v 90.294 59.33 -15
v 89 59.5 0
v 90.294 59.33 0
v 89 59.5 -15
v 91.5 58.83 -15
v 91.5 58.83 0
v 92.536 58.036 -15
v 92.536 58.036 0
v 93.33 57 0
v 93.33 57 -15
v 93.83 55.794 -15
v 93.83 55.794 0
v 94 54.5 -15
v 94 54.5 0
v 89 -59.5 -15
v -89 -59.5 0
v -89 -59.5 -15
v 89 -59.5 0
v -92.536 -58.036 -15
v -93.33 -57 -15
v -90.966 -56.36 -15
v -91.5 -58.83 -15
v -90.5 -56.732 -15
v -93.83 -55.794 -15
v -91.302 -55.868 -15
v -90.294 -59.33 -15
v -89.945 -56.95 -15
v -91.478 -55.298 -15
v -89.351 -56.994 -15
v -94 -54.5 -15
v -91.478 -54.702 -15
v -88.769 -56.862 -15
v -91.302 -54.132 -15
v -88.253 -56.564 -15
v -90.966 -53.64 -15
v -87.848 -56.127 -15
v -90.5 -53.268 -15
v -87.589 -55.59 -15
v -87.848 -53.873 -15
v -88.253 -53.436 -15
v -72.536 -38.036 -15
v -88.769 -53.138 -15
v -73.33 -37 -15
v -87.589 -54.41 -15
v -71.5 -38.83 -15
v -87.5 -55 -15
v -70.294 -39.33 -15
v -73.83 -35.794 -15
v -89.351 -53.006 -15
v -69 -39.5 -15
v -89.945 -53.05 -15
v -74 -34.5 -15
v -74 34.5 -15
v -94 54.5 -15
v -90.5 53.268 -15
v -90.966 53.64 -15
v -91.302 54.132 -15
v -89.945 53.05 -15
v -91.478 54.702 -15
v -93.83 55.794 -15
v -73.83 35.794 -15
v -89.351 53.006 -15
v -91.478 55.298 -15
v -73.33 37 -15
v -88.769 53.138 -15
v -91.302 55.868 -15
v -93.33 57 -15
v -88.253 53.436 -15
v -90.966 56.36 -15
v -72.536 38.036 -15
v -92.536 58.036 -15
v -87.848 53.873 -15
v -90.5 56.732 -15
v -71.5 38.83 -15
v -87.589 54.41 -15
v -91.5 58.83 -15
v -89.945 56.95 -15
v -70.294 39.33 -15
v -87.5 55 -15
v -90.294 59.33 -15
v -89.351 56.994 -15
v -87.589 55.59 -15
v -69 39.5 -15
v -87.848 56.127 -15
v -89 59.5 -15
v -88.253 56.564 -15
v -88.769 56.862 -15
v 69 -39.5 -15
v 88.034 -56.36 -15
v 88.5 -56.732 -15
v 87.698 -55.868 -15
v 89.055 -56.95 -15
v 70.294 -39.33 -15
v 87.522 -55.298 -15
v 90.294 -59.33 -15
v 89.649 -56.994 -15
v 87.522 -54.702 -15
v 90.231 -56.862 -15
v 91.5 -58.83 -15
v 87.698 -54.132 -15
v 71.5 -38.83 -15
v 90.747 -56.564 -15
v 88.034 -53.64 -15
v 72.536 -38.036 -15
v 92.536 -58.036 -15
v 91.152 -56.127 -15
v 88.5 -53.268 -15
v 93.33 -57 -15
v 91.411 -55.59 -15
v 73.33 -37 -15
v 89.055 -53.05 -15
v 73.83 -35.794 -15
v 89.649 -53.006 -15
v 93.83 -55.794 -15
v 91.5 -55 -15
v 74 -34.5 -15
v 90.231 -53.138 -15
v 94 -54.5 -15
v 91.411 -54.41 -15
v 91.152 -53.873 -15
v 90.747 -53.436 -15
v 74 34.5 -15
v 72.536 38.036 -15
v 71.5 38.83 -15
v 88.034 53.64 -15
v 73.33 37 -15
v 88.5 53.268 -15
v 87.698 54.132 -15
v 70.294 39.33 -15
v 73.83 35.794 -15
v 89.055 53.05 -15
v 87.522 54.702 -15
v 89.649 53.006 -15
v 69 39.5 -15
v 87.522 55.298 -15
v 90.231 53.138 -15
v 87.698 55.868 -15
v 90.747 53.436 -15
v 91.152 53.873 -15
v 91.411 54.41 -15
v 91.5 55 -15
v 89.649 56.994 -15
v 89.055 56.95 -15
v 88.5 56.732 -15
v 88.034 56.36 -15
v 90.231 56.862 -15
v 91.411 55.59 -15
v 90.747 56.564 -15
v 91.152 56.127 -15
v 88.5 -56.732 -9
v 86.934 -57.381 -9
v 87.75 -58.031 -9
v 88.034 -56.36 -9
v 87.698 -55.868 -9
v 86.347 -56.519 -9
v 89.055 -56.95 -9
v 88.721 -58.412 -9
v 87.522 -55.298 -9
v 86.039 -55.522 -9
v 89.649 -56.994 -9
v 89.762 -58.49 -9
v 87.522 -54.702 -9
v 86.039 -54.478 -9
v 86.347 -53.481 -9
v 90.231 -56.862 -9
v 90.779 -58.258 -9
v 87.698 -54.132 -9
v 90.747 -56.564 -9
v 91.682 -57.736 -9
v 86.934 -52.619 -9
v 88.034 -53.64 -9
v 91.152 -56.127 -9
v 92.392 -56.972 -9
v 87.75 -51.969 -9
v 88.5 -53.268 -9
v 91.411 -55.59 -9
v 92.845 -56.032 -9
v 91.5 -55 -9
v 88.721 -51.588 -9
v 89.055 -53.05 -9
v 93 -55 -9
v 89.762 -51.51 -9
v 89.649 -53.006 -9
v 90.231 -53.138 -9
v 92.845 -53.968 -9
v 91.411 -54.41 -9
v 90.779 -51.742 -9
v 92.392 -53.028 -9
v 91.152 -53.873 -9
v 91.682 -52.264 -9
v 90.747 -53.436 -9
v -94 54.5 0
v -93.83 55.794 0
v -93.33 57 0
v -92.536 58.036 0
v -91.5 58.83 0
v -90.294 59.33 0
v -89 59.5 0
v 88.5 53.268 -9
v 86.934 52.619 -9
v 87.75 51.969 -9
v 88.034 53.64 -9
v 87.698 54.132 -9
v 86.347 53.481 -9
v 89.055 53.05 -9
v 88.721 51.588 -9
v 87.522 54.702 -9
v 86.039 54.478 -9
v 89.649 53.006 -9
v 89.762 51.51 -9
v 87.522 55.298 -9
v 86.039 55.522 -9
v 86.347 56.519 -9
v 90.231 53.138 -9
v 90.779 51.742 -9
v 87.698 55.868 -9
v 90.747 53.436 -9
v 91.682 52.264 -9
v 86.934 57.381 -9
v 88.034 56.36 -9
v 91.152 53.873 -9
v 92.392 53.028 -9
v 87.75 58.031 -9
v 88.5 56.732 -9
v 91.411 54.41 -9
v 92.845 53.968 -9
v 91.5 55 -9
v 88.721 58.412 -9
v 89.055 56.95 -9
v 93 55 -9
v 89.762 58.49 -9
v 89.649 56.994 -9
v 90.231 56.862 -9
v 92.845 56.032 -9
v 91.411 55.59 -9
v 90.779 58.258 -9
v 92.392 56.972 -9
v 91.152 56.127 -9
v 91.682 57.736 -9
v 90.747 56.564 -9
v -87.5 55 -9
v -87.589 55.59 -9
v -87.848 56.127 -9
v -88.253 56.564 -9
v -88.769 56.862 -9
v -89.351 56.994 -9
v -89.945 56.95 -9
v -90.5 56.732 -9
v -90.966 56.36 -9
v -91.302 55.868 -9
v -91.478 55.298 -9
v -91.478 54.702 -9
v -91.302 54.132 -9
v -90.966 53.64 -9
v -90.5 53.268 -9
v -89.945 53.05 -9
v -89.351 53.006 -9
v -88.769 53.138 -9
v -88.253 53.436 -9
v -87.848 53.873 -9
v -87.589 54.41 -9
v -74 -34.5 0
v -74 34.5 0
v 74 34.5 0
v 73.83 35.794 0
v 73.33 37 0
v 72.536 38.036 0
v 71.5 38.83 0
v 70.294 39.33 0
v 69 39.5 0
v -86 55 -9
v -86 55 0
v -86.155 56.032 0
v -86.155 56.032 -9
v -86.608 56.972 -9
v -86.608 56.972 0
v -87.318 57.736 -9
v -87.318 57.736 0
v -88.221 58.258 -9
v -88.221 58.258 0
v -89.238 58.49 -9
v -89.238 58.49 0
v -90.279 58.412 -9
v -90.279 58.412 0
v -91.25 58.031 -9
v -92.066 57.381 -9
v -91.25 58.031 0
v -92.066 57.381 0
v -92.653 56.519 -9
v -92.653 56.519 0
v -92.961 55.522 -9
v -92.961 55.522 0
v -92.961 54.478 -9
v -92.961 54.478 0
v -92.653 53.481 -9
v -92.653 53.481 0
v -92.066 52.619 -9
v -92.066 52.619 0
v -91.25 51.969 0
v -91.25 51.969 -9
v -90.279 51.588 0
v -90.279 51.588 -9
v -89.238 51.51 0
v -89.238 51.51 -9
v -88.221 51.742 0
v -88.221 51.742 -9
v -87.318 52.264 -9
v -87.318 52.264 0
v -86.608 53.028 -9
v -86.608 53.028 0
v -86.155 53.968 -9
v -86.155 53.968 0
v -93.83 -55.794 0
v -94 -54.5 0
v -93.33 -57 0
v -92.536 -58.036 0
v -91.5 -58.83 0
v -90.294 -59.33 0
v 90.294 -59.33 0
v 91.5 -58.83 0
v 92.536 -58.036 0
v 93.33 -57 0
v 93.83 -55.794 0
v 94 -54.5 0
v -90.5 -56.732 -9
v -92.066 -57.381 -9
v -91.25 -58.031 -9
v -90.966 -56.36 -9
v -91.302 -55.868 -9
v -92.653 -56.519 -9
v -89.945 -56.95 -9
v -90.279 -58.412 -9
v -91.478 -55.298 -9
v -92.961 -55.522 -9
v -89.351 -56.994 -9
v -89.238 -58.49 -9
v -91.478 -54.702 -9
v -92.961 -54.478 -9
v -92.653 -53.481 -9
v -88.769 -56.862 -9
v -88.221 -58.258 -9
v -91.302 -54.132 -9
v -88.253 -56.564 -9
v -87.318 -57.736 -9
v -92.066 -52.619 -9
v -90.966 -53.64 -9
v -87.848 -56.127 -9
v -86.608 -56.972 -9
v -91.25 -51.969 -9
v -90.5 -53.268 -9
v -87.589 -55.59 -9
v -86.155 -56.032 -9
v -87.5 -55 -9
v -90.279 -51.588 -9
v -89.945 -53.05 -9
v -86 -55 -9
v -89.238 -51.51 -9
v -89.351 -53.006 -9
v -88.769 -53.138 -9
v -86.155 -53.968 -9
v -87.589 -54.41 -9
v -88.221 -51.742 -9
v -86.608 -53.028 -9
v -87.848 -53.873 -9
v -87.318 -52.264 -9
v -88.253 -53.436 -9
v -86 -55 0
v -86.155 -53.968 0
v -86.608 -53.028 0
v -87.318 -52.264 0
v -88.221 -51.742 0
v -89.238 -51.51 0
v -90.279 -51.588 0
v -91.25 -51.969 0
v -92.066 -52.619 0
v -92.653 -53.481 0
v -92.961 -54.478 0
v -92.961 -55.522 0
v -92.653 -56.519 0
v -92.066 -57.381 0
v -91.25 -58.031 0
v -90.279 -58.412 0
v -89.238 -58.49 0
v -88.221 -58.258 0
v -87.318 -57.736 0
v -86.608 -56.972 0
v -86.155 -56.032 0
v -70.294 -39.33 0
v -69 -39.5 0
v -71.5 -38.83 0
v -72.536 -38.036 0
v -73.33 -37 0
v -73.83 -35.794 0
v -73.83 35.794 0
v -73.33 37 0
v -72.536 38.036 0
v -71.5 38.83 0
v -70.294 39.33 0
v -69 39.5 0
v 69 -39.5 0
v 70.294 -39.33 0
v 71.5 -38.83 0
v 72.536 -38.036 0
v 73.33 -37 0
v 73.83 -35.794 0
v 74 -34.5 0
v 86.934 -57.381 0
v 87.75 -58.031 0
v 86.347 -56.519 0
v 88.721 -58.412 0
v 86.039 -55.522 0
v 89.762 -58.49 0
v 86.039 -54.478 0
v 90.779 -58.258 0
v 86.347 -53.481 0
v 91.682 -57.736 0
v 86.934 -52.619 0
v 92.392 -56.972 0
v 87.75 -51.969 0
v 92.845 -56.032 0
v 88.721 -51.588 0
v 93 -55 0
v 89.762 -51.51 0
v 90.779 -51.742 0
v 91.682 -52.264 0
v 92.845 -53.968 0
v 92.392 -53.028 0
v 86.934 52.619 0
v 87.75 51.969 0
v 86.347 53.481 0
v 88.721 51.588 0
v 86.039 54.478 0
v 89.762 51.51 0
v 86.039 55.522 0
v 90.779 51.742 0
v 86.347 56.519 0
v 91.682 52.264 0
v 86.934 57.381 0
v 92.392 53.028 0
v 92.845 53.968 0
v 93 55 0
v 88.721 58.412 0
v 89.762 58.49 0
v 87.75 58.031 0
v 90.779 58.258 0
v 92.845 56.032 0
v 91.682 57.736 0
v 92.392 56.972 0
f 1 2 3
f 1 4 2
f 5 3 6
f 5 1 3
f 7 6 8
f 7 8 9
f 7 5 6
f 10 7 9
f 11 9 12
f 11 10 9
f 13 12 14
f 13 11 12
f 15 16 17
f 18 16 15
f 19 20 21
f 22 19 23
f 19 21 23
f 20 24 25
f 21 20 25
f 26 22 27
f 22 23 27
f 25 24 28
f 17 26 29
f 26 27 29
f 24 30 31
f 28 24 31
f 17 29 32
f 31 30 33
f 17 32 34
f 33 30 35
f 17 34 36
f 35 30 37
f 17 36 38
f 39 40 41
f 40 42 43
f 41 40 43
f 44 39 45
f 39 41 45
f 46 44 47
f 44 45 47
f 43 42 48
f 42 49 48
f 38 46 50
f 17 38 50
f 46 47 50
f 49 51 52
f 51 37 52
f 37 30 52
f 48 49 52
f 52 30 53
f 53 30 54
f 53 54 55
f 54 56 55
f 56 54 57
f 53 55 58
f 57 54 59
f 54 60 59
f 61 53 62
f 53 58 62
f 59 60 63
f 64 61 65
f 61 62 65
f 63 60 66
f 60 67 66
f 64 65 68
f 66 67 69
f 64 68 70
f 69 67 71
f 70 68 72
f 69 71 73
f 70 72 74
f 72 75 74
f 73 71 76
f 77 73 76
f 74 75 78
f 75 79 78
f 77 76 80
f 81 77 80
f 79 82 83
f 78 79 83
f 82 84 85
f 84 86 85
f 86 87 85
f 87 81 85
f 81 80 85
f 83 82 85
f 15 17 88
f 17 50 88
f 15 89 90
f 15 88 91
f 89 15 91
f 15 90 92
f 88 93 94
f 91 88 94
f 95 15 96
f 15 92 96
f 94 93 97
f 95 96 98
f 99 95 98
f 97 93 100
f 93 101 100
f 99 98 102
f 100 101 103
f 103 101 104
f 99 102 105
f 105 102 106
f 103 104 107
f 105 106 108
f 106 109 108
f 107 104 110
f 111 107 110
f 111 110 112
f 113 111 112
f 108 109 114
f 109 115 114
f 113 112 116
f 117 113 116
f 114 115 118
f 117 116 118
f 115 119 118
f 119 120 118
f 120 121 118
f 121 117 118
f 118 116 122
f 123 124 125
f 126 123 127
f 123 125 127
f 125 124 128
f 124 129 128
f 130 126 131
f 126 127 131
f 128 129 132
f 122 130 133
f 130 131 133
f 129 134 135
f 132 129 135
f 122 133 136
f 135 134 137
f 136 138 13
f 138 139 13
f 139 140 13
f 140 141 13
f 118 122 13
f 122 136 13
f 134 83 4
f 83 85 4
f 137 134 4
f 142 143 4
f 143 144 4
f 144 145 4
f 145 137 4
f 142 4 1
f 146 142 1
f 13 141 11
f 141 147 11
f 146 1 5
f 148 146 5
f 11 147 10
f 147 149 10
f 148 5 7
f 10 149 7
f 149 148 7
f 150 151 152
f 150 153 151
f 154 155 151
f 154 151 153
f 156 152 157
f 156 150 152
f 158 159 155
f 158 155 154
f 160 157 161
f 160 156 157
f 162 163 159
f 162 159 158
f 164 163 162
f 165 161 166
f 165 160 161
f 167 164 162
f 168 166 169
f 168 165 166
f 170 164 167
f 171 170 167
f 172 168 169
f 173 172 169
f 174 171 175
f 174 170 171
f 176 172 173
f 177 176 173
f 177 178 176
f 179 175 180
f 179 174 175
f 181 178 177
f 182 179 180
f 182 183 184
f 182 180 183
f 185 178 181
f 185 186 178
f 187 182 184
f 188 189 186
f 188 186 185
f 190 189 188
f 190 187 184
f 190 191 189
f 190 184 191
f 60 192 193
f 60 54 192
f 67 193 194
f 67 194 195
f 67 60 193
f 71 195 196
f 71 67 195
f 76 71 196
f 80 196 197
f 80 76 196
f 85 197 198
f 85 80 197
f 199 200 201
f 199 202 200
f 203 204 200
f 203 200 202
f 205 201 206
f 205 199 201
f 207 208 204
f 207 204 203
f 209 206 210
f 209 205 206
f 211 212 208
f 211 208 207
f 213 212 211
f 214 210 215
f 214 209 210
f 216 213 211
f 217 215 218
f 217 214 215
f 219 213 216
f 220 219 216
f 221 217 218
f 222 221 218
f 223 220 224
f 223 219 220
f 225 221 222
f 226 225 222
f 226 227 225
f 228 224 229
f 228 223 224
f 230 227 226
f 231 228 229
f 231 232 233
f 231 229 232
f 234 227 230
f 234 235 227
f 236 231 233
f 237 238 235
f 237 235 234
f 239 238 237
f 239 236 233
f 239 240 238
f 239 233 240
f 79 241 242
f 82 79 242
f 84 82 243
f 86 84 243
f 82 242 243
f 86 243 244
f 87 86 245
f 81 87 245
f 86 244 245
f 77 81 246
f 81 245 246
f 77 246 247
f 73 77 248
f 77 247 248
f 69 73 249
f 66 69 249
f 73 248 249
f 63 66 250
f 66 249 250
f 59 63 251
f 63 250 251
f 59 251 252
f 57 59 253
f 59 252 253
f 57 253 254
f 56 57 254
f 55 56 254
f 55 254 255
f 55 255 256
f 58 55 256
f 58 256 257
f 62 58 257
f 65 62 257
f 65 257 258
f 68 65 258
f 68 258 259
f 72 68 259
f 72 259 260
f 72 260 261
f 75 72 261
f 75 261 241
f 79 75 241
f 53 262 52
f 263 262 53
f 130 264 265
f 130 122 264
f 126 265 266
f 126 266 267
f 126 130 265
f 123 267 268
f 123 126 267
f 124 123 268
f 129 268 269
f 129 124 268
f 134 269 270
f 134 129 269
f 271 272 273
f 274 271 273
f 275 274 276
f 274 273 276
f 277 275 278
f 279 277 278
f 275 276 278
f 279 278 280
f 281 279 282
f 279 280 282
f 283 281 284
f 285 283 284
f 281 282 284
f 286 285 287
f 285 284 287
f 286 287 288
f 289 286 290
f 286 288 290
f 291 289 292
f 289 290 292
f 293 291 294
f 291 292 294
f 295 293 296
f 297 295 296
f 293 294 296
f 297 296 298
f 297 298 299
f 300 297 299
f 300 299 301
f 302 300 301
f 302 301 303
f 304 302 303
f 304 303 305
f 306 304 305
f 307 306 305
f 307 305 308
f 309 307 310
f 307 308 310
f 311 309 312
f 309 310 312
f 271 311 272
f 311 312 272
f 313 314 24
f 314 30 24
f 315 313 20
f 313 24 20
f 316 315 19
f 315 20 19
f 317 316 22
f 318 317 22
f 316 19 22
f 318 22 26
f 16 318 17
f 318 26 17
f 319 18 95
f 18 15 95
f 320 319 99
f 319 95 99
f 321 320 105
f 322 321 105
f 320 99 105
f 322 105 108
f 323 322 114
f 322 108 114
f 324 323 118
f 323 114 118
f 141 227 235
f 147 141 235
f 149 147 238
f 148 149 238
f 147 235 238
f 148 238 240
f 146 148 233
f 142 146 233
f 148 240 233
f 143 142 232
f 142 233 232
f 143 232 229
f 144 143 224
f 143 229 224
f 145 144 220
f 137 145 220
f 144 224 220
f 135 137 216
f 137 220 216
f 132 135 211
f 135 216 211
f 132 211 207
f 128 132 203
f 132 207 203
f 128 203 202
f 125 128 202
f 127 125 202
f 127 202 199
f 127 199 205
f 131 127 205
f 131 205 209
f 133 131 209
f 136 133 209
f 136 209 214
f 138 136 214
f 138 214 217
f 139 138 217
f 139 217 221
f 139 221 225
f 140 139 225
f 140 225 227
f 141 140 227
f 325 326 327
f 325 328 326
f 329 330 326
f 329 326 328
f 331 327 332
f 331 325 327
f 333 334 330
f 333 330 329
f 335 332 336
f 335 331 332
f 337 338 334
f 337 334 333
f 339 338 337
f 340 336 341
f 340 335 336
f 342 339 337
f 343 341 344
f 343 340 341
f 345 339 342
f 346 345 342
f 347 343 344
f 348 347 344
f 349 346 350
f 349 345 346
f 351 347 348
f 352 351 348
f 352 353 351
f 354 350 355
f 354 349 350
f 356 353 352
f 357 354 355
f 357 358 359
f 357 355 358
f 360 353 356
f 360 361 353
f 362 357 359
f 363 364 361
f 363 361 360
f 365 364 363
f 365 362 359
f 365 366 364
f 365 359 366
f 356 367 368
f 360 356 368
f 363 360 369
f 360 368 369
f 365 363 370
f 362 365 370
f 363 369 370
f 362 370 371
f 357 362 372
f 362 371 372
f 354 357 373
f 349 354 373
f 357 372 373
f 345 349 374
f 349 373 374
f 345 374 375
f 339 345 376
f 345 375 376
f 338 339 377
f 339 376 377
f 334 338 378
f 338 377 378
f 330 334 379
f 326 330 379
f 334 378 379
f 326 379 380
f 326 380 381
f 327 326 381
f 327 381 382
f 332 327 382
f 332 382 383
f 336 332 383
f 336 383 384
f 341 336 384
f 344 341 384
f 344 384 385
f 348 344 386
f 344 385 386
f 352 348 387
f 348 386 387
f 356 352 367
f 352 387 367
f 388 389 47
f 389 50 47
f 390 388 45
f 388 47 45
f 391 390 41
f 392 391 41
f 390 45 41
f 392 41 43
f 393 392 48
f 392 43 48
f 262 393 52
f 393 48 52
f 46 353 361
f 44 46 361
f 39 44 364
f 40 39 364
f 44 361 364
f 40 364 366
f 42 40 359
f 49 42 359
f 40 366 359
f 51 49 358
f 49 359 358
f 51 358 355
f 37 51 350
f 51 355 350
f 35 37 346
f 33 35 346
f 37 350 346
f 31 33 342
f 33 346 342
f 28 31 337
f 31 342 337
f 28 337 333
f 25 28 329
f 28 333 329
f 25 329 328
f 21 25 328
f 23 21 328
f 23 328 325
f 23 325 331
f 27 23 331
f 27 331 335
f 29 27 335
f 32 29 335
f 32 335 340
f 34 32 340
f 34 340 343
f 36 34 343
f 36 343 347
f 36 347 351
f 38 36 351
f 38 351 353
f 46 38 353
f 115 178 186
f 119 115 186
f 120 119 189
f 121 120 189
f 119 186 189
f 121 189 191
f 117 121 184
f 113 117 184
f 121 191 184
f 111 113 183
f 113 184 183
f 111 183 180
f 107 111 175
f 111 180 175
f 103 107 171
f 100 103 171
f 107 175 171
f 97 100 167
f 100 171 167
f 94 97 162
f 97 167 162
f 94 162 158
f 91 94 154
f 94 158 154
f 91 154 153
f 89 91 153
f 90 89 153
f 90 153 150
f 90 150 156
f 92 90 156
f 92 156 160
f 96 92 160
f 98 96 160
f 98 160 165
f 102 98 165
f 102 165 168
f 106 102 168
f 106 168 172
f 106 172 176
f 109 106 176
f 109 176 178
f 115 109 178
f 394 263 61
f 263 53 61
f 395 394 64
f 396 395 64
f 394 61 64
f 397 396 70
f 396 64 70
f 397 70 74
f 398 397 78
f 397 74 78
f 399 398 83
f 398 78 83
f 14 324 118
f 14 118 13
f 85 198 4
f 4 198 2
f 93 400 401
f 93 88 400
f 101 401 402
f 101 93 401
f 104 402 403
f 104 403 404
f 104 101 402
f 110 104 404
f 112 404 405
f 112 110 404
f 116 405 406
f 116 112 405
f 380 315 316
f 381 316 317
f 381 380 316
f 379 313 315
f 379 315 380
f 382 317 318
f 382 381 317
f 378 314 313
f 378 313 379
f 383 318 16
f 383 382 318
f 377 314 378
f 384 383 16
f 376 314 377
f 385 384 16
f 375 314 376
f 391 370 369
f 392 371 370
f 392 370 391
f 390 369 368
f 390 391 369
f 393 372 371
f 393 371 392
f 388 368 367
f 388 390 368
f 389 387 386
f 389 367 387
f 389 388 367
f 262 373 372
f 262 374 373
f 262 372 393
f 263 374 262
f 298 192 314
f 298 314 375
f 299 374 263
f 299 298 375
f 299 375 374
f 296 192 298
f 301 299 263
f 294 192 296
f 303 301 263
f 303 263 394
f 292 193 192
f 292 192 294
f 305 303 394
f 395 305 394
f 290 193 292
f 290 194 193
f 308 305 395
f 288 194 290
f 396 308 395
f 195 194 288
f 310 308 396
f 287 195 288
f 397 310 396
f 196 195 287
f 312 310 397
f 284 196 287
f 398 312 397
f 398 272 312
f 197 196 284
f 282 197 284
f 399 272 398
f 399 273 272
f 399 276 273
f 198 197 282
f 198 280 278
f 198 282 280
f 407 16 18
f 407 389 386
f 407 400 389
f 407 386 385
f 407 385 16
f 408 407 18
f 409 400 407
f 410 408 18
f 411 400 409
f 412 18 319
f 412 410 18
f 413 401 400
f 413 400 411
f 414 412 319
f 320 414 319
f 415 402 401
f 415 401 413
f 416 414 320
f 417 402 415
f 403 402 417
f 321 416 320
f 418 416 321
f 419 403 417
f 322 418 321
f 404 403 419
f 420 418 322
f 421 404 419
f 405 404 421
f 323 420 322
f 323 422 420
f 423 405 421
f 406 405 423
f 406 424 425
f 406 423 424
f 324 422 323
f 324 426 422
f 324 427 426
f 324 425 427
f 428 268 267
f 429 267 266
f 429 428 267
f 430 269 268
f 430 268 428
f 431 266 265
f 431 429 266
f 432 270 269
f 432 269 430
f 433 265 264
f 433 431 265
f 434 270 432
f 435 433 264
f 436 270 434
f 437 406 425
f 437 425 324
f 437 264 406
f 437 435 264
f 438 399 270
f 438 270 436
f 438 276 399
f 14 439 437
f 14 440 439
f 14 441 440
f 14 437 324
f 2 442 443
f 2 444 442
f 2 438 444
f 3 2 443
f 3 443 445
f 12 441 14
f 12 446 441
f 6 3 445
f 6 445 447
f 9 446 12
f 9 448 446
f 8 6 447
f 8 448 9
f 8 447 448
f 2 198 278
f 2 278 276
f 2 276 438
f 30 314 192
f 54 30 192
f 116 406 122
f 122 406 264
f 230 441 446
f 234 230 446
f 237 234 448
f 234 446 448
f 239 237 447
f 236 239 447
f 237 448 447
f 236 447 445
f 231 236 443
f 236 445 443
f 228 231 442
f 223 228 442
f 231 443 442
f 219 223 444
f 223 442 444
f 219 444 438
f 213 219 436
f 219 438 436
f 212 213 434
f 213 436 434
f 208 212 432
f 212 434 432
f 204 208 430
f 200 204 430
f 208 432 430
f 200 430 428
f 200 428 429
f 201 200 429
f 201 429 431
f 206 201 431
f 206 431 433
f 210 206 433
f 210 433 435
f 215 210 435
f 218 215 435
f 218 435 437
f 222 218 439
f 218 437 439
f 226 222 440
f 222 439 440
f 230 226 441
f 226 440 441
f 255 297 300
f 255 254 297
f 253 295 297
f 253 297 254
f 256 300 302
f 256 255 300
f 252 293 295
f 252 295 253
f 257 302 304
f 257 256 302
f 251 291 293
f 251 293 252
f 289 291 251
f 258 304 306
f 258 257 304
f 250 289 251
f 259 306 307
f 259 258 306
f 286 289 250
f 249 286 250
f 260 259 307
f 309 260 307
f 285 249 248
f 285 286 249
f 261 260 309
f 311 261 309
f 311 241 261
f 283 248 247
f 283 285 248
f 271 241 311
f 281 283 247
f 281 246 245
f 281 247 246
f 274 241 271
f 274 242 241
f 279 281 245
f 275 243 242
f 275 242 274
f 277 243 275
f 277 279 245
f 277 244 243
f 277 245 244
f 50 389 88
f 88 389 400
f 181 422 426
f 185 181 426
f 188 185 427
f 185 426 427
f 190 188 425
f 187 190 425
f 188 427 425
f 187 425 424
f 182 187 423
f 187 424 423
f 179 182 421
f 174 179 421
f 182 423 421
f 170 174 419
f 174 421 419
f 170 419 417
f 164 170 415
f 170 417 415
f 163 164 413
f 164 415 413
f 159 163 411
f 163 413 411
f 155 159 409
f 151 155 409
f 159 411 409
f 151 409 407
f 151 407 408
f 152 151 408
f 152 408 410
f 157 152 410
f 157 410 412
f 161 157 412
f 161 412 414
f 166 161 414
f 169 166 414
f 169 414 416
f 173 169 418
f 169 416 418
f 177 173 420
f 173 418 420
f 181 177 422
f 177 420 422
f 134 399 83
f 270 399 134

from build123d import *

# Parameters (mm, degrees)
F0_W     = 188
F0_H     = 119
F0_R     = 3.5
F0_W_2   = 148
F0_H_2   = 79
F0_R_2   = 2
F1_DEPTH = 15
F2_DEPTH = 9
F3_R     = 5


with BuildPart() as f1:
    # F0 (on Top) → F1 (new body)
    with BuildSketch(Plane.XY):
        Rectangle(F0_W, F0_H)
        with Locations((-89.5, -55)):
            Circle(F0_R, mode=Mode.SUBTRACT)
        with Locations((89.5, -55)):
            Circle(F0_R, mode=Mode.SUBTRACT)
        with Locations((-89.5, 55)):
            Circle(F0_R, mode=Mode.SUBTRACT)
        Rectangle(F0_W_2, F0_H_2, mode=Mode.SUBTRACT)
        with Locations((89.5, 55)):
            Circle(F0_R, mode=Mode.SUBTRACT)
        with Locations((-89.5, 55)):
            Circle(F0_R)
        with Locations((-89.5, 55)):
            Circle(F0_R_2, mode=Mode.SUBTRACT)
        with Locations((89.5, 55)):
            Circle(F0_R)
        with Locations((89.5, 55)):
            Circle(F0_R_2, mode=Mode.SUBTRACT)
        with Locations((89.5, -55)):
            Circle(F0_R)
        with Locations((89.5, -55)):
            Circle(F0_R_2, mode=Mode.SUBTRACT)
        with Locations((-89.5, -55)):
            Circle(F0_R)
        with Locations((-89.5, -55)):
            Circle(F0_R_2, mode=Mode.SUBTRACT)
    extrude(amount=-F1_DEPTH)

    # F0 (on Top) → F2 (cut)
    with BuildSketch(Plane.XY):
        with Locations((-89.5, 55)):
            Circle(F0_R)
        with Locations((-89.5, 55)):
            Circle(F0_R_2, mode=Mode.SUBTRACT)
        with Locations((89.5, 55)):
            Circle(F0_R)
        with Locations((89.5, 55)):
            Circle(F0_R_2, mode=Mode.SUBTRACT)
        with Locations((89.5, -55)):
            Circle(F0_R)
        with Locations((89.5, -55)):
            Circle(F0_R_2, mode=Mode.SUBTRACT)
        with Locations((-89.5, -55)):
            Circle(F0_R)
        with Locations((-89.5, -55)):
            Circle(F0_R_2, mode=Mode.SUBTRACT)
    extrude(amount=-F2_DEPTH, mode=Mode.SUBTRACT)

    # F3
    f3_edges = [f1.edges().sort_by_distance(p)[0] for p in [
        (94, 59.5, -7.5),
        (-94, 59.5, -7.5),
        (-94, -59.5, -7.5),
        (94, -59.5, -7.5),
        (-74, 39.5, -7.5),
        (74, 39.5, -7.5),
        (74, -39.5, -7.5),
        (-74, -39.5, -7.5),
    ]]
    fillet(f3_edges, radius=F3_R)


solid = f1.part
